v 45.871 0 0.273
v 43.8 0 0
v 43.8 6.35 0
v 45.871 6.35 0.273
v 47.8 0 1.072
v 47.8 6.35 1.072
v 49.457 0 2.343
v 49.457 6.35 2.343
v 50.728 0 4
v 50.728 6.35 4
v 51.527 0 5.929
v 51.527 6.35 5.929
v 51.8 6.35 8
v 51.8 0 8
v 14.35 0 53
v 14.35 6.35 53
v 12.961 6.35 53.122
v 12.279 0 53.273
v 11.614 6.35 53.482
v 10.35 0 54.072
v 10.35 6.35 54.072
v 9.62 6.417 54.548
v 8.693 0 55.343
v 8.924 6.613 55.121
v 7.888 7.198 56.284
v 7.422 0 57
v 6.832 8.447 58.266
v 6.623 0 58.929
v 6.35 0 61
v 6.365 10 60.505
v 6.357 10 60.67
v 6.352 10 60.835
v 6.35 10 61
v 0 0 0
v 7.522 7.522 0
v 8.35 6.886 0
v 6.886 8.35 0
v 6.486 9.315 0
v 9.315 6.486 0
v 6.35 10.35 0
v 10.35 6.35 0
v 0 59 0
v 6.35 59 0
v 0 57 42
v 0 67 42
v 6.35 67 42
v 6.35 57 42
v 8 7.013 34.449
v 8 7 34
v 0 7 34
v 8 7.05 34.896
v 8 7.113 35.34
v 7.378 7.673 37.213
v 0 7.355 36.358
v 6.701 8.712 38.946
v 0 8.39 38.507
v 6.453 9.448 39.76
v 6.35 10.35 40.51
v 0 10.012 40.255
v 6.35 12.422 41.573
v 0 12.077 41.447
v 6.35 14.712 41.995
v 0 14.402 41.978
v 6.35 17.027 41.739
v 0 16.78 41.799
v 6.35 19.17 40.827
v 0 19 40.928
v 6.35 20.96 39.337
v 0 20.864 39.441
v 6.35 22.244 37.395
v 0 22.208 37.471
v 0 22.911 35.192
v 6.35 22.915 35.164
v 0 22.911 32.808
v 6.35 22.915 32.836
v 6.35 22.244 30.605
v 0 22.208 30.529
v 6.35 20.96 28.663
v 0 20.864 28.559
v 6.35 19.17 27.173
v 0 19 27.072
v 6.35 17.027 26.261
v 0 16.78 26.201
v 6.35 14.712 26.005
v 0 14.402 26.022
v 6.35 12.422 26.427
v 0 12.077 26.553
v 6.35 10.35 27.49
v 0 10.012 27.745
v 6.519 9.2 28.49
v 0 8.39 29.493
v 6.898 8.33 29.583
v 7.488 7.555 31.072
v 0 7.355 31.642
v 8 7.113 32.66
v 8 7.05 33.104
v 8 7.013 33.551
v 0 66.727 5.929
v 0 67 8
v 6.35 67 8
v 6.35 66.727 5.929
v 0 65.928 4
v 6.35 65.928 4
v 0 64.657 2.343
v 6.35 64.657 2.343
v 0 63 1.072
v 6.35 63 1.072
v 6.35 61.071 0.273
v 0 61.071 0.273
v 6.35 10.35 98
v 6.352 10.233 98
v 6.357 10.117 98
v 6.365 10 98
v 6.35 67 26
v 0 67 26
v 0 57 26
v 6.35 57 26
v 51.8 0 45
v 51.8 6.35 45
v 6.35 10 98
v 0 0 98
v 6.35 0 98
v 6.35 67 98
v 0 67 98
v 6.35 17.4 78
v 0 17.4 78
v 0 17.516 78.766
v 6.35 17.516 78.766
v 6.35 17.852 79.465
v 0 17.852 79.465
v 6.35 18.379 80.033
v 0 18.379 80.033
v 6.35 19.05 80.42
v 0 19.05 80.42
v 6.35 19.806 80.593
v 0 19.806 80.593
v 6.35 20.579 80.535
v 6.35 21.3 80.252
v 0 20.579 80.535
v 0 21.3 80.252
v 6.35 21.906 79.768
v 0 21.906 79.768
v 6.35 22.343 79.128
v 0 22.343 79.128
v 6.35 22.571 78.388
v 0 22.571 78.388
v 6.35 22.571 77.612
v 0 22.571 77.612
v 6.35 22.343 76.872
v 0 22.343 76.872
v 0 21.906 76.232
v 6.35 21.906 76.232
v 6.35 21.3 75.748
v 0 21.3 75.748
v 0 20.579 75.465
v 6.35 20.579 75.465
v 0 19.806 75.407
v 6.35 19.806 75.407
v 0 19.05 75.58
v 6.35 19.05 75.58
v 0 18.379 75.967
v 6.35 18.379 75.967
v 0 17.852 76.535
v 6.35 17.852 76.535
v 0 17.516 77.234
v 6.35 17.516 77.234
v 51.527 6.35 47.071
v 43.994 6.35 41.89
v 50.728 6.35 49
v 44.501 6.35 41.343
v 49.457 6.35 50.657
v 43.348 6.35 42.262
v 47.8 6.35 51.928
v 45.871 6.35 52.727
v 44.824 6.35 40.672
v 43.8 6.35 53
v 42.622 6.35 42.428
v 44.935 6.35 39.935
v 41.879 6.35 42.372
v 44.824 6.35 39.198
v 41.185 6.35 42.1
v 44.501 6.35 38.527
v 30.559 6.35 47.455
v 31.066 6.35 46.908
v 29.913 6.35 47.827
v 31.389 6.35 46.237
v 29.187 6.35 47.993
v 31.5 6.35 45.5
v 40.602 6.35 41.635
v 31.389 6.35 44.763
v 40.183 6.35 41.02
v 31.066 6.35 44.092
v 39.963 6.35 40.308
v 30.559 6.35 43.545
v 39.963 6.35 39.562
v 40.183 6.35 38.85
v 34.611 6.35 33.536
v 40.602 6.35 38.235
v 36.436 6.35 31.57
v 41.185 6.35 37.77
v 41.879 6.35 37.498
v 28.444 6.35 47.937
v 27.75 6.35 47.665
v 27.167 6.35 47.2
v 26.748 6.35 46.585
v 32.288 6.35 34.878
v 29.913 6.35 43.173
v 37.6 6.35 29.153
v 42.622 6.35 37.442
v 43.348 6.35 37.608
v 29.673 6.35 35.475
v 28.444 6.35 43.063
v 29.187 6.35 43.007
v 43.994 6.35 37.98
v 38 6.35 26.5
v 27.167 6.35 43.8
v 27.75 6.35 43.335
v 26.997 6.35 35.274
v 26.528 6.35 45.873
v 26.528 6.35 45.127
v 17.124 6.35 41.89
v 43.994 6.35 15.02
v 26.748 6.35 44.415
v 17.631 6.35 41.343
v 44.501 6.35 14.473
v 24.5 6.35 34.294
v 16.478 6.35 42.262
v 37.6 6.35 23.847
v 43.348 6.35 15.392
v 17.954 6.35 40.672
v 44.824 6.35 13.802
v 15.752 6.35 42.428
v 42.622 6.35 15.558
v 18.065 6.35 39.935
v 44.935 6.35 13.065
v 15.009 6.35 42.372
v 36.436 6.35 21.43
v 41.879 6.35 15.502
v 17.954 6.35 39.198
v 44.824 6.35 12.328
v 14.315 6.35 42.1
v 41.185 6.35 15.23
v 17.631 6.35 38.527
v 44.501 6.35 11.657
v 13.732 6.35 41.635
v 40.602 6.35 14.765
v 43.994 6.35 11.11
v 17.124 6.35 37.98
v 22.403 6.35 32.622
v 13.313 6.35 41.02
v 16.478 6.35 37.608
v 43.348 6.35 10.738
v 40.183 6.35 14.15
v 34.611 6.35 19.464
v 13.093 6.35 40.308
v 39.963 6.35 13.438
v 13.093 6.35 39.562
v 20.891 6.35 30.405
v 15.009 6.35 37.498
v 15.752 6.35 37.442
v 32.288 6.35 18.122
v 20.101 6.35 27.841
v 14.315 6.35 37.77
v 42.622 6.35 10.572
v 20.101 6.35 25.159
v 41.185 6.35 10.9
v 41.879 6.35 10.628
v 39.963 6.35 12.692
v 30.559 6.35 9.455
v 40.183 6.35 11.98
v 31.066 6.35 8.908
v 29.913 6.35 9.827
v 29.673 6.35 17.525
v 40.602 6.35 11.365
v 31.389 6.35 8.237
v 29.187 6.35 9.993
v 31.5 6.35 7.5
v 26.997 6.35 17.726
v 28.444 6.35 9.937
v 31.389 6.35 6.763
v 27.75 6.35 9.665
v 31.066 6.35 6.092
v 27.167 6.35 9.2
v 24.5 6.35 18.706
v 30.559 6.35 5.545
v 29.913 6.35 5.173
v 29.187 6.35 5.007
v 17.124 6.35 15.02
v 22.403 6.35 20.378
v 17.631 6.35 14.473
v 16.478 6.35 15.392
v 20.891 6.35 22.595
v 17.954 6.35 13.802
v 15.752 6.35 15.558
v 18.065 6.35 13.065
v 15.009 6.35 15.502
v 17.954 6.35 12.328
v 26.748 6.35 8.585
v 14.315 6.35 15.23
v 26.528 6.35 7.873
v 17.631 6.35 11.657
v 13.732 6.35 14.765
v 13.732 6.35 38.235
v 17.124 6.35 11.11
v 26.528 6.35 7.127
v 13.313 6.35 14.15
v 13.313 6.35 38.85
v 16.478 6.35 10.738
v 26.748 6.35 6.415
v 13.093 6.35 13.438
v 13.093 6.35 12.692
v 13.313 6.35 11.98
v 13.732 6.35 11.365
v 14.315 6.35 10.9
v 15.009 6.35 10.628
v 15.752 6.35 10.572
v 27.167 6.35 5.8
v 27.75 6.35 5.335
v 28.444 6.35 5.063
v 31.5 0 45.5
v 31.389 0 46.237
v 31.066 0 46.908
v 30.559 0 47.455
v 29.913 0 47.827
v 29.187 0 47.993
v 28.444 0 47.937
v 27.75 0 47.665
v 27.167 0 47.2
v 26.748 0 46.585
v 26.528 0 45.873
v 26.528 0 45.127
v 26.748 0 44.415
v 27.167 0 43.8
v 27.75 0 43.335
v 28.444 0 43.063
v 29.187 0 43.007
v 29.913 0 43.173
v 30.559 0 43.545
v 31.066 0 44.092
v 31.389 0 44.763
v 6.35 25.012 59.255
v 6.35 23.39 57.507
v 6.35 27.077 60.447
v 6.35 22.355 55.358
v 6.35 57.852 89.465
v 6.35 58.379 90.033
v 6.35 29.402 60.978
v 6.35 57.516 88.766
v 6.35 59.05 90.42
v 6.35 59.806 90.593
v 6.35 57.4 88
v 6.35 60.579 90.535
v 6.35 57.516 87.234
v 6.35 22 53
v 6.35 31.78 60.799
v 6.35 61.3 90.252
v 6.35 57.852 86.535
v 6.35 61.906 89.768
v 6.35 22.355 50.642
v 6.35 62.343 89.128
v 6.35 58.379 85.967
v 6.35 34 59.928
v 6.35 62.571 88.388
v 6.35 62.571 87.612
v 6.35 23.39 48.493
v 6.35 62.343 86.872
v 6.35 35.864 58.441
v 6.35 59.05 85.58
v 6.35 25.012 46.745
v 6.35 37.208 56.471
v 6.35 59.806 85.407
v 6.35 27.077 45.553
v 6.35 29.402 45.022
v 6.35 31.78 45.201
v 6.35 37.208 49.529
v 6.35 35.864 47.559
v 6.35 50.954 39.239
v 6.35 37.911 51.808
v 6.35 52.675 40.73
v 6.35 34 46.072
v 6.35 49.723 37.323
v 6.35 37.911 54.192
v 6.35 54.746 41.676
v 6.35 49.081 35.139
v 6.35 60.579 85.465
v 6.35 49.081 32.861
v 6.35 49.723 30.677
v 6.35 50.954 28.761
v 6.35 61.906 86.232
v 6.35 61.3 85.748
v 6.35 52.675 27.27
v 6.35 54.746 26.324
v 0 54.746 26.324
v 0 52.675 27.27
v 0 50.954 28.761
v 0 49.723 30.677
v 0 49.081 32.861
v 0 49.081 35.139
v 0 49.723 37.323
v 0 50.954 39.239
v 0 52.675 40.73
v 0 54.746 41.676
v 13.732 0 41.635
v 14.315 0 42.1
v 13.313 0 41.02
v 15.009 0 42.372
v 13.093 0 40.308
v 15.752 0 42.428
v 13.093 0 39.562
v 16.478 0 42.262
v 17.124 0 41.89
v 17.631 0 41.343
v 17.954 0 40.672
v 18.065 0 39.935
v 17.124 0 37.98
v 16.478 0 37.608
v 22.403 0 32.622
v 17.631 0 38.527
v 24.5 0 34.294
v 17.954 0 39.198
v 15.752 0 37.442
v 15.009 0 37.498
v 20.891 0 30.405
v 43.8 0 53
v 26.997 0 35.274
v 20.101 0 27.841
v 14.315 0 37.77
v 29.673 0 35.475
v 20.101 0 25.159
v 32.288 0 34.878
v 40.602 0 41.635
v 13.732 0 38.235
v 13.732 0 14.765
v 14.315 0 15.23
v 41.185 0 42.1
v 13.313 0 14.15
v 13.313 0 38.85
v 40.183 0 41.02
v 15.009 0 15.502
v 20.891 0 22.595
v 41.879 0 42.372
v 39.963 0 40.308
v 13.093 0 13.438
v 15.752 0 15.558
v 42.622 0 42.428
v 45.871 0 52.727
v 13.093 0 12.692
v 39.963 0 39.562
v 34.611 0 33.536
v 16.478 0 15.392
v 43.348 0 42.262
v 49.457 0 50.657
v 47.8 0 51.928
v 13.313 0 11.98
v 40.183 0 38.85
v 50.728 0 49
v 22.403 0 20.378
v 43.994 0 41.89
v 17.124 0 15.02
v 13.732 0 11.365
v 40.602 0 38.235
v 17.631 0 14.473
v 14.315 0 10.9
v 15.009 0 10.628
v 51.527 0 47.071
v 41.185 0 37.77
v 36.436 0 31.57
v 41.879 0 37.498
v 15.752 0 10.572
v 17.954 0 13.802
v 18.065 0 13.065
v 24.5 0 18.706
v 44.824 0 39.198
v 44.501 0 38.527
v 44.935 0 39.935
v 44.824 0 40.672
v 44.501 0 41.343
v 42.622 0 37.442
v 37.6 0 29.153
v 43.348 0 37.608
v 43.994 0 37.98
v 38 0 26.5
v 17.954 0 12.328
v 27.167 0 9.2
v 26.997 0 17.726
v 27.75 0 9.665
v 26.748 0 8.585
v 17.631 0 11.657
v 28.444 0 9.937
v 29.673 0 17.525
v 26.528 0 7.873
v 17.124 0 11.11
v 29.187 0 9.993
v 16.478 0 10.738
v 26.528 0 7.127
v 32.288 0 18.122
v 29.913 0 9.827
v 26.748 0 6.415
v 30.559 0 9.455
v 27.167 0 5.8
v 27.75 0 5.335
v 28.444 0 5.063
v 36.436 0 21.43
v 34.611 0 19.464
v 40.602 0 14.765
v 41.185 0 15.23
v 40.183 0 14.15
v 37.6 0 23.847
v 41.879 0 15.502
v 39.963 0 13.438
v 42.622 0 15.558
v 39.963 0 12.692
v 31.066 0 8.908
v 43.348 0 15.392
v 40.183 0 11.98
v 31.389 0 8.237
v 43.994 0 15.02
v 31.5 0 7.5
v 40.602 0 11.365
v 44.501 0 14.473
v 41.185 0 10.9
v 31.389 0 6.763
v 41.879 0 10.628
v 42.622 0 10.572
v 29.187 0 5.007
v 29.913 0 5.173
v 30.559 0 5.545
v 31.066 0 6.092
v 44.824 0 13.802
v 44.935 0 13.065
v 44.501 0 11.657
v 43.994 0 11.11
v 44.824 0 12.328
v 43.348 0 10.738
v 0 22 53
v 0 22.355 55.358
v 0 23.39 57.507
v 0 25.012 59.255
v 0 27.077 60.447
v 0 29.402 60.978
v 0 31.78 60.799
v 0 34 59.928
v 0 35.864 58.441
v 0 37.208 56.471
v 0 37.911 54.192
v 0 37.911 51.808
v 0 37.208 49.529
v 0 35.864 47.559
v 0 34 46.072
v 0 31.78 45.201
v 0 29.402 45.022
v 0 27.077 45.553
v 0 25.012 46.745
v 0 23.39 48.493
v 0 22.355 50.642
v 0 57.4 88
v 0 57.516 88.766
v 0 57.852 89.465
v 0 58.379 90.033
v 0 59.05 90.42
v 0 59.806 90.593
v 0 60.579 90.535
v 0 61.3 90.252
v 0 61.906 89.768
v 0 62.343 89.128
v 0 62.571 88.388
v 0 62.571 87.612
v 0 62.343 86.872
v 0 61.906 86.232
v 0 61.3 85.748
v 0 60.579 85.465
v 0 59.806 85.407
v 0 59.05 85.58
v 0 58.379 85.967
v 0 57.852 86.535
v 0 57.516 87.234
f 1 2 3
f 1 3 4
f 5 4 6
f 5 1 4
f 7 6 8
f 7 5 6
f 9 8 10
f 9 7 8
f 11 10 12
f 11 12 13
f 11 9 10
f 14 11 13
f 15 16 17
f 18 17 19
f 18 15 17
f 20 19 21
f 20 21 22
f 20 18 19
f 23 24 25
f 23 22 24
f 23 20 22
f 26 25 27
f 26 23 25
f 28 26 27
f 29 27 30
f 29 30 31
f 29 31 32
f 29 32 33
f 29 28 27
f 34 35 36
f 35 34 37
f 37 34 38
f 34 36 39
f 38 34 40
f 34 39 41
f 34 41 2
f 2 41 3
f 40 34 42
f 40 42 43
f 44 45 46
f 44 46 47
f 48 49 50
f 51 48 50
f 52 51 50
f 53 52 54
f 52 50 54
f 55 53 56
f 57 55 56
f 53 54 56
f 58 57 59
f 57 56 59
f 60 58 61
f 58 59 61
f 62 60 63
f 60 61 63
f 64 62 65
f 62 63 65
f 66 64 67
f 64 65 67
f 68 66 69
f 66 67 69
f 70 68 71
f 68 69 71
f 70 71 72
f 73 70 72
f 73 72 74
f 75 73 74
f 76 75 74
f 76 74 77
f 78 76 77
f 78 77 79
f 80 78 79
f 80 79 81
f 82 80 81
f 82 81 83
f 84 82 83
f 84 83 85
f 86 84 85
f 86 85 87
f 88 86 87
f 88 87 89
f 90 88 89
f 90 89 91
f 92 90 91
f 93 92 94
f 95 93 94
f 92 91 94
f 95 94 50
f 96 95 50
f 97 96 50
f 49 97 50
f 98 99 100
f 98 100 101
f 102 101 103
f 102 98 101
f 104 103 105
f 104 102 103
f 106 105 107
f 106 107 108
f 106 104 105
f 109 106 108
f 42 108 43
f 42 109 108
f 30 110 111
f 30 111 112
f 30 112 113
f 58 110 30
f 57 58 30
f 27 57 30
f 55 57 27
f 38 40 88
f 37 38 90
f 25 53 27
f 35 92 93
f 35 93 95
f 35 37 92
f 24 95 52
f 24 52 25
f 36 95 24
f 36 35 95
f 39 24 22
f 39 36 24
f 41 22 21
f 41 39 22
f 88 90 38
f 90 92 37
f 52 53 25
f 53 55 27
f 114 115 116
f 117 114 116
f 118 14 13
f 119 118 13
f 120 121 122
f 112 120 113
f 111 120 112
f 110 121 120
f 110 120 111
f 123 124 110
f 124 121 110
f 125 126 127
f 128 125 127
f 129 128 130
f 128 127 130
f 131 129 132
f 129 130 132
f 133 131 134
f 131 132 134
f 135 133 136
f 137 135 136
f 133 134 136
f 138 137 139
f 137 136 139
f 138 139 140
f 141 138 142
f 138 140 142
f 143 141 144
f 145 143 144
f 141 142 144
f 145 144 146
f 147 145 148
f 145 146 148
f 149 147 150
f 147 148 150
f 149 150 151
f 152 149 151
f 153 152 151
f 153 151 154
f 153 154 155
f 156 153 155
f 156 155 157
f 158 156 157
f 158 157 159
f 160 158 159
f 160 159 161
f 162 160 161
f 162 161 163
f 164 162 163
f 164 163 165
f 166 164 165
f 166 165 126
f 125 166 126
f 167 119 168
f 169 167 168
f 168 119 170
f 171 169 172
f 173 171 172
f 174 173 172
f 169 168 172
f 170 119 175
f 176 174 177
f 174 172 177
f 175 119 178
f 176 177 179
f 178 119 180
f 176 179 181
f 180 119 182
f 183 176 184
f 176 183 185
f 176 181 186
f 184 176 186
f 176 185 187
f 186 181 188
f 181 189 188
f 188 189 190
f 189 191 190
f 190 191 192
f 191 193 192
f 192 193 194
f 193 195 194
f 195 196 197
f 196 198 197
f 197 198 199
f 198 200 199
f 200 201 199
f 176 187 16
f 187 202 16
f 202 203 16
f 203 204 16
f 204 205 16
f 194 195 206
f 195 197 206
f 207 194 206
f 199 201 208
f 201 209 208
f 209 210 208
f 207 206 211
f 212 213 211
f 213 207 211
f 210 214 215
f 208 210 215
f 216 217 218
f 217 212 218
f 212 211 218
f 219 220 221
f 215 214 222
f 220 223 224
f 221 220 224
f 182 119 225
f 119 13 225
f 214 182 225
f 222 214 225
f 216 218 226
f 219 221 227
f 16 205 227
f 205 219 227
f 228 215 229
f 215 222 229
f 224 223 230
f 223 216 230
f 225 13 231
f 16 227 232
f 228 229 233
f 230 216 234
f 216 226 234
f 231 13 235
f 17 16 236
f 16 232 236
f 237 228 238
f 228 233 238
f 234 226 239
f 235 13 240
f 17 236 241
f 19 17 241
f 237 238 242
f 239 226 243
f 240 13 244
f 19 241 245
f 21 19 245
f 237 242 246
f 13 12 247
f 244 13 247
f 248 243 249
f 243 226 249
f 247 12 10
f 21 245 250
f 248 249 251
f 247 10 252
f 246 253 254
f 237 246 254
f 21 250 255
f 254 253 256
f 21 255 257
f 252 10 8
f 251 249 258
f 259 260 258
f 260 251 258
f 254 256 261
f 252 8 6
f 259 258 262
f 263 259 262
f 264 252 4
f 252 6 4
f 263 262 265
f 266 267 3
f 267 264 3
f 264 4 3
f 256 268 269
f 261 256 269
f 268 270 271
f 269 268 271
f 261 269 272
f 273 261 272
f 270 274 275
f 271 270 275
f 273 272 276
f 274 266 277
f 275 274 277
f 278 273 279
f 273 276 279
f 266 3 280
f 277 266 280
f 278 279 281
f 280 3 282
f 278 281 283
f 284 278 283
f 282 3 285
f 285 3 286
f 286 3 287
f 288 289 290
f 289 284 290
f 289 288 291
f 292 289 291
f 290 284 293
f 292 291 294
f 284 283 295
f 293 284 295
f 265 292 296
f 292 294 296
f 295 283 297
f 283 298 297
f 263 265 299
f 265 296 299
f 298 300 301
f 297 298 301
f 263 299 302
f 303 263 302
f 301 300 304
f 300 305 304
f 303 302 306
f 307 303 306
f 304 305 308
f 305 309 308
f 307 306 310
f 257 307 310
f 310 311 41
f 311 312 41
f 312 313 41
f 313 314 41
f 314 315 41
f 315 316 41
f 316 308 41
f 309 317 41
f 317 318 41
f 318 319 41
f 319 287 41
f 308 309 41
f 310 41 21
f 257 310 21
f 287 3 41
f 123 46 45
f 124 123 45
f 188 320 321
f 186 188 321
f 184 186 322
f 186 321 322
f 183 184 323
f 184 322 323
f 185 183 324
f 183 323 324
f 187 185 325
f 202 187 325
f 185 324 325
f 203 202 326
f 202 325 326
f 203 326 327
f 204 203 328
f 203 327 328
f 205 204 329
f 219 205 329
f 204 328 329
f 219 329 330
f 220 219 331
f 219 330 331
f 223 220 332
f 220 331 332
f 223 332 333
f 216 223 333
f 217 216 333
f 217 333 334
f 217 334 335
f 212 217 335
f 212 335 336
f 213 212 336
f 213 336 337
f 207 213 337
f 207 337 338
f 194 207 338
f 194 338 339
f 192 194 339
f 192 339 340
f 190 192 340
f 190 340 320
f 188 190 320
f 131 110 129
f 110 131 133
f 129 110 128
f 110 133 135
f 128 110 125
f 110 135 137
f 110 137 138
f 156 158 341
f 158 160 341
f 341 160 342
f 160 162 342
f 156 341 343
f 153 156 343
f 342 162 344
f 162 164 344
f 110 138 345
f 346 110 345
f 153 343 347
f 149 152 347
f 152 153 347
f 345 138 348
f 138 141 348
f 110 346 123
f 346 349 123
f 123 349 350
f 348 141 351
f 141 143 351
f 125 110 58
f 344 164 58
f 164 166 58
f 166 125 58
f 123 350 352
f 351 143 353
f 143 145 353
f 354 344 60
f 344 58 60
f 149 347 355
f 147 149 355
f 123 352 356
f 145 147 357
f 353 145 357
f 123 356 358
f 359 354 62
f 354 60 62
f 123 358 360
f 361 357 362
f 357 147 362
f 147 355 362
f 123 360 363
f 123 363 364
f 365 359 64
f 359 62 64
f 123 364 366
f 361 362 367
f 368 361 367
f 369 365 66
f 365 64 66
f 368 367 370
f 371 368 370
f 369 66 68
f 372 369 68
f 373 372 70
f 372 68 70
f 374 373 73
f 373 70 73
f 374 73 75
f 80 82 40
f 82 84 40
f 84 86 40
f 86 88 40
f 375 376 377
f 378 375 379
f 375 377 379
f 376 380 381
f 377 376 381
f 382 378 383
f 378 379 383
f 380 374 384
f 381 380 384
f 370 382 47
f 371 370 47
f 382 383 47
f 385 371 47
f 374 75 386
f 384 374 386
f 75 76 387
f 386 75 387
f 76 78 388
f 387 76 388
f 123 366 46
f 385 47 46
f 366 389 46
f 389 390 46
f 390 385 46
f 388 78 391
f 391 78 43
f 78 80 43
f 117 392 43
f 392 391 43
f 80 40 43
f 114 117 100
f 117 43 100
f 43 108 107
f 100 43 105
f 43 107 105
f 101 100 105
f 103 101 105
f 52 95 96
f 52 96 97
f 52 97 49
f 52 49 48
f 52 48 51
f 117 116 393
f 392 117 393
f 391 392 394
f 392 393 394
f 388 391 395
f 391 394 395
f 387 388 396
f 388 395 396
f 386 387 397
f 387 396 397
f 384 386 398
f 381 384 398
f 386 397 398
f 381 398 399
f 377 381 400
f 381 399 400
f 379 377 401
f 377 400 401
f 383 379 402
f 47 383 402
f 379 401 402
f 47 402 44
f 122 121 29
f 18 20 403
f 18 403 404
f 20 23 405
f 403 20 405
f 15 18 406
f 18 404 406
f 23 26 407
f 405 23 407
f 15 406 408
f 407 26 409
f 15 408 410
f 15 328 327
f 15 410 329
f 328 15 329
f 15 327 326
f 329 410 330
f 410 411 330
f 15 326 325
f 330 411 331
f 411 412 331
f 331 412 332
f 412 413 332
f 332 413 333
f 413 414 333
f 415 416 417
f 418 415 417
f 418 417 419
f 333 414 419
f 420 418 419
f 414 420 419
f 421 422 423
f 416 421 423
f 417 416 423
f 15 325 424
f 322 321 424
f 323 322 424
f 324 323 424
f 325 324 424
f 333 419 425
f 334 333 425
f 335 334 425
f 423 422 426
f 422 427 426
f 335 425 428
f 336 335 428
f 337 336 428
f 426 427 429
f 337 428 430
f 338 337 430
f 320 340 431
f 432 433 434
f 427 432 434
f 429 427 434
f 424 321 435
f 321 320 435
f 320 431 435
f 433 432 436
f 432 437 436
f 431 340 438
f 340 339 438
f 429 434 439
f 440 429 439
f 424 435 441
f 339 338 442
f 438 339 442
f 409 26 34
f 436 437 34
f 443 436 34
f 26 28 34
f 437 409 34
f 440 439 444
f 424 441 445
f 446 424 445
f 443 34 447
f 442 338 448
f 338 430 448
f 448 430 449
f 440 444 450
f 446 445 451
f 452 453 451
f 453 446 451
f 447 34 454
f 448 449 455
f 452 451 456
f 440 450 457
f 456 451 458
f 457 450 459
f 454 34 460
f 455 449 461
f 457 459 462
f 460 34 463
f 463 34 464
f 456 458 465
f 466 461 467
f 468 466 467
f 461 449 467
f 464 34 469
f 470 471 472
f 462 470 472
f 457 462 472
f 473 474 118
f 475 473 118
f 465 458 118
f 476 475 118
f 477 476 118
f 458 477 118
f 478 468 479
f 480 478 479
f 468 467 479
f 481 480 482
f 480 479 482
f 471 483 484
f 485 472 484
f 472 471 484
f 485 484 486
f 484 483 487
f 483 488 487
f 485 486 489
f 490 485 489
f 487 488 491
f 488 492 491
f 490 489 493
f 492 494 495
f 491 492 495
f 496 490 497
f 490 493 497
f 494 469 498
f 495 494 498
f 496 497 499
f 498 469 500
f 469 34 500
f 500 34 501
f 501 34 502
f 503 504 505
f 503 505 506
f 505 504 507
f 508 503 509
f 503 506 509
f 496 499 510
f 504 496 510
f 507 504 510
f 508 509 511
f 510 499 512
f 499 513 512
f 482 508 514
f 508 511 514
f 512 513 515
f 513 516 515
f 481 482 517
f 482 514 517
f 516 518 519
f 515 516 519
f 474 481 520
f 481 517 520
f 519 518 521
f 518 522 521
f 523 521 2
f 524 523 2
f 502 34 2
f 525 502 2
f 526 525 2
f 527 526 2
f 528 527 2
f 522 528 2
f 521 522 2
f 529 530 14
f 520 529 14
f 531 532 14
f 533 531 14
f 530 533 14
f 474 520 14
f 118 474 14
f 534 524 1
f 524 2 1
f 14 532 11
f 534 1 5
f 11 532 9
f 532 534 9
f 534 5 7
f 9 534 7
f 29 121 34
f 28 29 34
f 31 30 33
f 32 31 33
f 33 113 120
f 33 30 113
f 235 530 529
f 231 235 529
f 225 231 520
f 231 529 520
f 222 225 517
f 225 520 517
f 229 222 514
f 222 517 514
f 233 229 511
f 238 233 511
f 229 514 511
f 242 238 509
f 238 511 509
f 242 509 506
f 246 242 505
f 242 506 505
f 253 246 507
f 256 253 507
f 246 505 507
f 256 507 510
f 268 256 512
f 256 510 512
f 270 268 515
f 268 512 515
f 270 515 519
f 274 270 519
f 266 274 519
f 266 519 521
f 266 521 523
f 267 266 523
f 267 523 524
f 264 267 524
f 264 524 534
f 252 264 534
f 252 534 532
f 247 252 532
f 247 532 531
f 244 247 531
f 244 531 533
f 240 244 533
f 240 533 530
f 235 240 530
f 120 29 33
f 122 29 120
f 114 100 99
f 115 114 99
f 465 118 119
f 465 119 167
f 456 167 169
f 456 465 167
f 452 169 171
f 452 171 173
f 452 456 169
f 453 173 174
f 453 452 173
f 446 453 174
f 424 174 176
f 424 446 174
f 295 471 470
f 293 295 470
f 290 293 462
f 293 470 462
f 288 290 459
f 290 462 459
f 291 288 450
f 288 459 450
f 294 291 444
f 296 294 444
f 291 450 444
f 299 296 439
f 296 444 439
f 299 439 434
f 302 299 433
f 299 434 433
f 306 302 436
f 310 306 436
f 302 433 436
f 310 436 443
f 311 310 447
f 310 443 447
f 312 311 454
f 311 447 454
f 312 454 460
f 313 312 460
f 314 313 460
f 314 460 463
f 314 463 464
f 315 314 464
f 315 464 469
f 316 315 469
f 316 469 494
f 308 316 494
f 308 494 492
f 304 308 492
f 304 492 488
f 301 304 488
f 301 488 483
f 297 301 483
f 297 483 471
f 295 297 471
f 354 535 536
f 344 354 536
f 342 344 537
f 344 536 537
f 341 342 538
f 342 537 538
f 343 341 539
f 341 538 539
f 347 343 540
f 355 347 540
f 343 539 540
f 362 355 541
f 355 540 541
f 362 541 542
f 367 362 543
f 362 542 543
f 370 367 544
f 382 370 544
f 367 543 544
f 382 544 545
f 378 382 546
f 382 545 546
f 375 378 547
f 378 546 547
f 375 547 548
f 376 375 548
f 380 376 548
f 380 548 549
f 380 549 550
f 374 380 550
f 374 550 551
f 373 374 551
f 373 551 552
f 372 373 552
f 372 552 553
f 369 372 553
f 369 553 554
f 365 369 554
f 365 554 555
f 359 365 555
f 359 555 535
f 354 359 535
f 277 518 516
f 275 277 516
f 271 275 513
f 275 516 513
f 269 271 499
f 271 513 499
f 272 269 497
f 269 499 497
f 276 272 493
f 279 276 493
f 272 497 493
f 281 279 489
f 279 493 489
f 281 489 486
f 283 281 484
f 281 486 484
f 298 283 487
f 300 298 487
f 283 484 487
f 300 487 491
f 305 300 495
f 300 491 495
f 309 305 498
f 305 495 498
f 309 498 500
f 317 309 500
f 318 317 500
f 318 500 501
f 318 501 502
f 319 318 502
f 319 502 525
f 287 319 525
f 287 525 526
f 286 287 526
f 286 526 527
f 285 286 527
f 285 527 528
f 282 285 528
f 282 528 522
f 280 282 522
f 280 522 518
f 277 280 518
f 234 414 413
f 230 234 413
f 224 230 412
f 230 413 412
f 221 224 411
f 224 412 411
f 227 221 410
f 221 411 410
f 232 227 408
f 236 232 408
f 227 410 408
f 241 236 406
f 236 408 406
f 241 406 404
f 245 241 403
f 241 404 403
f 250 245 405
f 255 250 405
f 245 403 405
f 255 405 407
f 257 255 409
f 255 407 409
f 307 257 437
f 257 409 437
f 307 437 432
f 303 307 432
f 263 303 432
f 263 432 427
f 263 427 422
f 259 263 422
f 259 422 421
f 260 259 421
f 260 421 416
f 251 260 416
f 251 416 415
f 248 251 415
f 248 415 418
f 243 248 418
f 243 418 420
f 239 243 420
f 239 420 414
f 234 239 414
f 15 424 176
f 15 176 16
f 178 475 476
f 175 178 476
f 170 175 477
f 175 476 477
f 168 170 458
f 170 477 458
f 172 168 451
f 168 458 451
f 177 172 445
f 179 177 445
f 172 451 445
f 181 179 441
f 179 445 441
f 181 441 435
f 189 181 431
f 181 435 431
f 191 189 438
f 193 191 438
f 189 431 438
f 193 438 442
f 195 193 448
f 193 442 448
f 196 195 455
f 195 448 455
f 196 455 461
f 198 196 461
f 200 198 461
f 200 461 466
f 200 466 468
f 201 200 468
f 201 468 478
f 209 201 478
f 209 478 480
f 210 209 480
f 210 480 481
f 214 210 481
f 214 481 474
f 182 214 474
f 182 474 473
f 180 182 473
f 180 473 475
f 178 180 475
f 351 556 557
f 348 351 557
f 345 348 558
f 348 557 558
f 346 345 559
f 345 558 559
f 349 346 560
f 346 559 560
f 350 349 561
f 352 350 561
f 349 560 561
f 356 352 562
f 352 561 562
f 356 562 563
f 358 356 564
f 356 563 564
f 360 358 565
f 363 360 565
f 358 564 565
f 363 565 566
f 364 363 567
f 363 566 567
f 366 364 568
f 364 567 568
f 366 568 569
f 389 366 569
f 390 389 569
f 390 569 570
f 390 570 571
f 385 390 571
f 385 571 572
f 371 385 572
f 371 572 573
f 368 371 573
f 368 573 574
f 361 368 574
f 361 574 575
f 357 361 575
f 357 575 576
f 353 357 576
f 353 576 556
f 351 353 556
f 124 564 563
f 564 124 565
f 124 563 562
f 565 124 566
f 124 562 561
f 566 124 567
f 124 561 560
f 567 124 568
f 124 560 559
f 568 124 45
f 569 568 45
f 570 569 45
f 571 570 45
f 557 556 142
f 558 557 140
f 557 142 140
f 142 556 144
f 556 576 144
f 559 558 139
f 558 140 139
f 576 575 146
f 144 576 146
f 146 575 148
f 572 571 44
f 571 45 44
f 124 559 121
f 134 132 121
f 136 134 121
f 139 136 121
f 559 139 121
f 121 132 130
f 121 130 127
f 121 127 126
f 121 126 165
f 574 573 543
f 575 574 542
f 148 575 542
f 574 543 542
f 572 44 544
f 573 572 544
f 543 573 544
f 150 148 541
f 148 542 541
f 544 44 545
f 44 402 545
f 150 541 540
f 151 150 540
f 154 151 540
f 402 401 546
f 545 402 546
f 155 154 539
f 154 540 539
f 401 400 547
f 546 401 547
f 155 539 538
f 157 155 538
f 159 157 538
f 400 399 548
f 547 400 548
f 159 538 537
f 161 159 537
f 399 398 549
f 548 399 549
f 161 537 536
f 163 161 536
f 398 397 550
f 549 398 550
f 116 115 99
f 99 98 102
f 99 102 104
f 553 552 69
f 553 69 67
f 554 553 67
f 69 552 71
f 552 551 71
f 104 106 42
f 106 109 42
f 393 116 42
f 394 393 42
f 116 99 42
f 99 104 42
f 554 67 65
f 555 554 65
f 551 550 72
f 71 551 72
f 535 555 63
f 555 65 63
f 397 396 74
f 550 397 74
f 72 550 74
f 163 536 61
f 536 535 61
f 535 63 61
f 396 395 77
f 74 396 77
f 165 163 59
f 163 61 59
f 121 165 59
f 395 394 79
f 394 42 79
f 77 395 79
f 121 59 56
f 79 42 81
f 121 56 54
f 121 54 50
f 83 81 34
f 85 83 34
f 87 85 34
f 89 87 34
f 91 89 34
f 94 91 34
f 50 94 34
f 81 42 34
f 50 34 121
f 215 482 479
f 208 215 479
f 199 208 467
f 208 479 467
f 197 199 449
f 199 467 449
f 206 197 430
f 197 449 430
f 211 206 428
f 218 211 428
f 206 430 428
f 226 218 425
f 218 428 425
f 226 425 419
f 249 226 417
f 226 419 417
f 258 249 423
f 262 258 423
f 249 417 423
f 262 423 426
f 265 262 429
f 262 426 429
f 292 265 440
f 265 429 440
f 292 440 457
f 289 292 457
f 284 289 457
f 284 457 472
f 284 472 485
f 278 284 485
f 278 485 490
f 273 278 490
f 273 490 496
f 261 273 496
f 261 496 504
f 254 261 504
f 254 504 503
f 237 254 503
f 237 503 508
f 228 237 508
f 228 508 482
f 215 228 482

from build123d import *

# Parameters (mm, degrees)
PAD001_DEPTH    = 98
SKETCH001_R     = 2.6
SKETCH001_R_2   = 8
POCKET_DEPTH    = 8
SKETCH002_R     = 9
SKETCH002_R_2   = 2.5
POCKET001_DEPTH = 10


with BuildPart() as part:
    # Sketch → Pad001 (new body)
    with BuildSketch(Plane.XY):
        with BuildLine():
            Line((6.35, 10.35), (6.35, 67))
            Line((6.35, 67), (0, 67))
            Line((0, 67), (0, 0))
            Line((0, 0), (51.8, 0))
            Line((51.8, 0), (51.8, 6.35))
            Line((51.8, 6.35), (10.35, 6.35))
            ThreePointArc((6.35, 10.35), (7.521573, 7.521573), (10.35, 6.35))
        make_face()
    extrude(amount=PAD001_DEPTH)

    # Sketch001 → Pocket (cut)
    with BuildSketch(Plane(origin=(0, 0, 0), x_dir=(0, -1, 0), z_dir=(-1, 0, 0))):
        with Locations((-60, 88)):
            Circle(SKETCH001_R)
        with Locations((-20, 78)):
            Circle(SKETCH001_R)
        with Locations((-30, 53)):
            Circle(SKETCH001_R_2)
        with Locations((-15, 34)):
            Circle(SKETCH001_R_2)
        with BuildLine():
            Line((-68, 0), (-68, 42))
            Line((-68, 42), (-56.999999, 42))
            ThreePointArc((-57.000001, 26), (-49, 33.999999), (-56.999999, 42))
            Line((-67, 26), (-57.000001, 26))
            Line((-67, 26), (-67, 7.999993))
            ThreePointArc((-67, 7.999993), (-64.656849, 2.343141), (-58.999993, 0))
            Line((-68, 0), (-58.999993, 0))
        make_face()
    extrude(amount=-POCKET_DEPTH, mode=Mode.SUBTRACT)

    # Sketch002 → Pocket001 (cut)
    with BuildSketch(Plane.XZ):
        with Locations((29, 26.5)):
            Circle(SKETCH002_R)
        with Locations((15.564971, 39.935029)):
            Circle(SKETCH002_R_2)
        with Locations((29, 45.5)):
            Circle(SKETCH002_R_2)
        with Locations((42.435029, 39.935029)):
            Circle(SKETCH002_R_2)
        with Locations((15.564971, 13.064971)):
            Circle(SKETCH002_R_2)
        with Locations((29, 7.5)):
            Circle(SKETCH002_R_2)
        with Locations((42.435029, 13.064971)):
            Circle(SKETCH002_R_2)
        with BuildLine():
            Line((6.35, 61.000036), (6.35, 98))
            Line((6.35, 98), (51.8, 98))
            Line((51.8, 98), (51.8, 45))
            ThreePointArc((51.8, 45), (49.456854, 50.656854), (43.8, 53))
            Line((43.8, 53), (14.35, 53))
            ThreePointArc((14.35, 53), (8.693133, 55.343159), (6.35, 61.000036))
        make_face()
        with BuildLine():
            ThreePointArc((43.8, 0), (49.456854, 2.343146), (51.8, 8))
            Line((51.8, 8), (51.8, 0))
            Line((51.8, 0), (43.8, 0))
        make_face()
    extrude(amount=-POCKET001_DEPTH, mode=Mode.SUBTRACT)


solid = part.part
